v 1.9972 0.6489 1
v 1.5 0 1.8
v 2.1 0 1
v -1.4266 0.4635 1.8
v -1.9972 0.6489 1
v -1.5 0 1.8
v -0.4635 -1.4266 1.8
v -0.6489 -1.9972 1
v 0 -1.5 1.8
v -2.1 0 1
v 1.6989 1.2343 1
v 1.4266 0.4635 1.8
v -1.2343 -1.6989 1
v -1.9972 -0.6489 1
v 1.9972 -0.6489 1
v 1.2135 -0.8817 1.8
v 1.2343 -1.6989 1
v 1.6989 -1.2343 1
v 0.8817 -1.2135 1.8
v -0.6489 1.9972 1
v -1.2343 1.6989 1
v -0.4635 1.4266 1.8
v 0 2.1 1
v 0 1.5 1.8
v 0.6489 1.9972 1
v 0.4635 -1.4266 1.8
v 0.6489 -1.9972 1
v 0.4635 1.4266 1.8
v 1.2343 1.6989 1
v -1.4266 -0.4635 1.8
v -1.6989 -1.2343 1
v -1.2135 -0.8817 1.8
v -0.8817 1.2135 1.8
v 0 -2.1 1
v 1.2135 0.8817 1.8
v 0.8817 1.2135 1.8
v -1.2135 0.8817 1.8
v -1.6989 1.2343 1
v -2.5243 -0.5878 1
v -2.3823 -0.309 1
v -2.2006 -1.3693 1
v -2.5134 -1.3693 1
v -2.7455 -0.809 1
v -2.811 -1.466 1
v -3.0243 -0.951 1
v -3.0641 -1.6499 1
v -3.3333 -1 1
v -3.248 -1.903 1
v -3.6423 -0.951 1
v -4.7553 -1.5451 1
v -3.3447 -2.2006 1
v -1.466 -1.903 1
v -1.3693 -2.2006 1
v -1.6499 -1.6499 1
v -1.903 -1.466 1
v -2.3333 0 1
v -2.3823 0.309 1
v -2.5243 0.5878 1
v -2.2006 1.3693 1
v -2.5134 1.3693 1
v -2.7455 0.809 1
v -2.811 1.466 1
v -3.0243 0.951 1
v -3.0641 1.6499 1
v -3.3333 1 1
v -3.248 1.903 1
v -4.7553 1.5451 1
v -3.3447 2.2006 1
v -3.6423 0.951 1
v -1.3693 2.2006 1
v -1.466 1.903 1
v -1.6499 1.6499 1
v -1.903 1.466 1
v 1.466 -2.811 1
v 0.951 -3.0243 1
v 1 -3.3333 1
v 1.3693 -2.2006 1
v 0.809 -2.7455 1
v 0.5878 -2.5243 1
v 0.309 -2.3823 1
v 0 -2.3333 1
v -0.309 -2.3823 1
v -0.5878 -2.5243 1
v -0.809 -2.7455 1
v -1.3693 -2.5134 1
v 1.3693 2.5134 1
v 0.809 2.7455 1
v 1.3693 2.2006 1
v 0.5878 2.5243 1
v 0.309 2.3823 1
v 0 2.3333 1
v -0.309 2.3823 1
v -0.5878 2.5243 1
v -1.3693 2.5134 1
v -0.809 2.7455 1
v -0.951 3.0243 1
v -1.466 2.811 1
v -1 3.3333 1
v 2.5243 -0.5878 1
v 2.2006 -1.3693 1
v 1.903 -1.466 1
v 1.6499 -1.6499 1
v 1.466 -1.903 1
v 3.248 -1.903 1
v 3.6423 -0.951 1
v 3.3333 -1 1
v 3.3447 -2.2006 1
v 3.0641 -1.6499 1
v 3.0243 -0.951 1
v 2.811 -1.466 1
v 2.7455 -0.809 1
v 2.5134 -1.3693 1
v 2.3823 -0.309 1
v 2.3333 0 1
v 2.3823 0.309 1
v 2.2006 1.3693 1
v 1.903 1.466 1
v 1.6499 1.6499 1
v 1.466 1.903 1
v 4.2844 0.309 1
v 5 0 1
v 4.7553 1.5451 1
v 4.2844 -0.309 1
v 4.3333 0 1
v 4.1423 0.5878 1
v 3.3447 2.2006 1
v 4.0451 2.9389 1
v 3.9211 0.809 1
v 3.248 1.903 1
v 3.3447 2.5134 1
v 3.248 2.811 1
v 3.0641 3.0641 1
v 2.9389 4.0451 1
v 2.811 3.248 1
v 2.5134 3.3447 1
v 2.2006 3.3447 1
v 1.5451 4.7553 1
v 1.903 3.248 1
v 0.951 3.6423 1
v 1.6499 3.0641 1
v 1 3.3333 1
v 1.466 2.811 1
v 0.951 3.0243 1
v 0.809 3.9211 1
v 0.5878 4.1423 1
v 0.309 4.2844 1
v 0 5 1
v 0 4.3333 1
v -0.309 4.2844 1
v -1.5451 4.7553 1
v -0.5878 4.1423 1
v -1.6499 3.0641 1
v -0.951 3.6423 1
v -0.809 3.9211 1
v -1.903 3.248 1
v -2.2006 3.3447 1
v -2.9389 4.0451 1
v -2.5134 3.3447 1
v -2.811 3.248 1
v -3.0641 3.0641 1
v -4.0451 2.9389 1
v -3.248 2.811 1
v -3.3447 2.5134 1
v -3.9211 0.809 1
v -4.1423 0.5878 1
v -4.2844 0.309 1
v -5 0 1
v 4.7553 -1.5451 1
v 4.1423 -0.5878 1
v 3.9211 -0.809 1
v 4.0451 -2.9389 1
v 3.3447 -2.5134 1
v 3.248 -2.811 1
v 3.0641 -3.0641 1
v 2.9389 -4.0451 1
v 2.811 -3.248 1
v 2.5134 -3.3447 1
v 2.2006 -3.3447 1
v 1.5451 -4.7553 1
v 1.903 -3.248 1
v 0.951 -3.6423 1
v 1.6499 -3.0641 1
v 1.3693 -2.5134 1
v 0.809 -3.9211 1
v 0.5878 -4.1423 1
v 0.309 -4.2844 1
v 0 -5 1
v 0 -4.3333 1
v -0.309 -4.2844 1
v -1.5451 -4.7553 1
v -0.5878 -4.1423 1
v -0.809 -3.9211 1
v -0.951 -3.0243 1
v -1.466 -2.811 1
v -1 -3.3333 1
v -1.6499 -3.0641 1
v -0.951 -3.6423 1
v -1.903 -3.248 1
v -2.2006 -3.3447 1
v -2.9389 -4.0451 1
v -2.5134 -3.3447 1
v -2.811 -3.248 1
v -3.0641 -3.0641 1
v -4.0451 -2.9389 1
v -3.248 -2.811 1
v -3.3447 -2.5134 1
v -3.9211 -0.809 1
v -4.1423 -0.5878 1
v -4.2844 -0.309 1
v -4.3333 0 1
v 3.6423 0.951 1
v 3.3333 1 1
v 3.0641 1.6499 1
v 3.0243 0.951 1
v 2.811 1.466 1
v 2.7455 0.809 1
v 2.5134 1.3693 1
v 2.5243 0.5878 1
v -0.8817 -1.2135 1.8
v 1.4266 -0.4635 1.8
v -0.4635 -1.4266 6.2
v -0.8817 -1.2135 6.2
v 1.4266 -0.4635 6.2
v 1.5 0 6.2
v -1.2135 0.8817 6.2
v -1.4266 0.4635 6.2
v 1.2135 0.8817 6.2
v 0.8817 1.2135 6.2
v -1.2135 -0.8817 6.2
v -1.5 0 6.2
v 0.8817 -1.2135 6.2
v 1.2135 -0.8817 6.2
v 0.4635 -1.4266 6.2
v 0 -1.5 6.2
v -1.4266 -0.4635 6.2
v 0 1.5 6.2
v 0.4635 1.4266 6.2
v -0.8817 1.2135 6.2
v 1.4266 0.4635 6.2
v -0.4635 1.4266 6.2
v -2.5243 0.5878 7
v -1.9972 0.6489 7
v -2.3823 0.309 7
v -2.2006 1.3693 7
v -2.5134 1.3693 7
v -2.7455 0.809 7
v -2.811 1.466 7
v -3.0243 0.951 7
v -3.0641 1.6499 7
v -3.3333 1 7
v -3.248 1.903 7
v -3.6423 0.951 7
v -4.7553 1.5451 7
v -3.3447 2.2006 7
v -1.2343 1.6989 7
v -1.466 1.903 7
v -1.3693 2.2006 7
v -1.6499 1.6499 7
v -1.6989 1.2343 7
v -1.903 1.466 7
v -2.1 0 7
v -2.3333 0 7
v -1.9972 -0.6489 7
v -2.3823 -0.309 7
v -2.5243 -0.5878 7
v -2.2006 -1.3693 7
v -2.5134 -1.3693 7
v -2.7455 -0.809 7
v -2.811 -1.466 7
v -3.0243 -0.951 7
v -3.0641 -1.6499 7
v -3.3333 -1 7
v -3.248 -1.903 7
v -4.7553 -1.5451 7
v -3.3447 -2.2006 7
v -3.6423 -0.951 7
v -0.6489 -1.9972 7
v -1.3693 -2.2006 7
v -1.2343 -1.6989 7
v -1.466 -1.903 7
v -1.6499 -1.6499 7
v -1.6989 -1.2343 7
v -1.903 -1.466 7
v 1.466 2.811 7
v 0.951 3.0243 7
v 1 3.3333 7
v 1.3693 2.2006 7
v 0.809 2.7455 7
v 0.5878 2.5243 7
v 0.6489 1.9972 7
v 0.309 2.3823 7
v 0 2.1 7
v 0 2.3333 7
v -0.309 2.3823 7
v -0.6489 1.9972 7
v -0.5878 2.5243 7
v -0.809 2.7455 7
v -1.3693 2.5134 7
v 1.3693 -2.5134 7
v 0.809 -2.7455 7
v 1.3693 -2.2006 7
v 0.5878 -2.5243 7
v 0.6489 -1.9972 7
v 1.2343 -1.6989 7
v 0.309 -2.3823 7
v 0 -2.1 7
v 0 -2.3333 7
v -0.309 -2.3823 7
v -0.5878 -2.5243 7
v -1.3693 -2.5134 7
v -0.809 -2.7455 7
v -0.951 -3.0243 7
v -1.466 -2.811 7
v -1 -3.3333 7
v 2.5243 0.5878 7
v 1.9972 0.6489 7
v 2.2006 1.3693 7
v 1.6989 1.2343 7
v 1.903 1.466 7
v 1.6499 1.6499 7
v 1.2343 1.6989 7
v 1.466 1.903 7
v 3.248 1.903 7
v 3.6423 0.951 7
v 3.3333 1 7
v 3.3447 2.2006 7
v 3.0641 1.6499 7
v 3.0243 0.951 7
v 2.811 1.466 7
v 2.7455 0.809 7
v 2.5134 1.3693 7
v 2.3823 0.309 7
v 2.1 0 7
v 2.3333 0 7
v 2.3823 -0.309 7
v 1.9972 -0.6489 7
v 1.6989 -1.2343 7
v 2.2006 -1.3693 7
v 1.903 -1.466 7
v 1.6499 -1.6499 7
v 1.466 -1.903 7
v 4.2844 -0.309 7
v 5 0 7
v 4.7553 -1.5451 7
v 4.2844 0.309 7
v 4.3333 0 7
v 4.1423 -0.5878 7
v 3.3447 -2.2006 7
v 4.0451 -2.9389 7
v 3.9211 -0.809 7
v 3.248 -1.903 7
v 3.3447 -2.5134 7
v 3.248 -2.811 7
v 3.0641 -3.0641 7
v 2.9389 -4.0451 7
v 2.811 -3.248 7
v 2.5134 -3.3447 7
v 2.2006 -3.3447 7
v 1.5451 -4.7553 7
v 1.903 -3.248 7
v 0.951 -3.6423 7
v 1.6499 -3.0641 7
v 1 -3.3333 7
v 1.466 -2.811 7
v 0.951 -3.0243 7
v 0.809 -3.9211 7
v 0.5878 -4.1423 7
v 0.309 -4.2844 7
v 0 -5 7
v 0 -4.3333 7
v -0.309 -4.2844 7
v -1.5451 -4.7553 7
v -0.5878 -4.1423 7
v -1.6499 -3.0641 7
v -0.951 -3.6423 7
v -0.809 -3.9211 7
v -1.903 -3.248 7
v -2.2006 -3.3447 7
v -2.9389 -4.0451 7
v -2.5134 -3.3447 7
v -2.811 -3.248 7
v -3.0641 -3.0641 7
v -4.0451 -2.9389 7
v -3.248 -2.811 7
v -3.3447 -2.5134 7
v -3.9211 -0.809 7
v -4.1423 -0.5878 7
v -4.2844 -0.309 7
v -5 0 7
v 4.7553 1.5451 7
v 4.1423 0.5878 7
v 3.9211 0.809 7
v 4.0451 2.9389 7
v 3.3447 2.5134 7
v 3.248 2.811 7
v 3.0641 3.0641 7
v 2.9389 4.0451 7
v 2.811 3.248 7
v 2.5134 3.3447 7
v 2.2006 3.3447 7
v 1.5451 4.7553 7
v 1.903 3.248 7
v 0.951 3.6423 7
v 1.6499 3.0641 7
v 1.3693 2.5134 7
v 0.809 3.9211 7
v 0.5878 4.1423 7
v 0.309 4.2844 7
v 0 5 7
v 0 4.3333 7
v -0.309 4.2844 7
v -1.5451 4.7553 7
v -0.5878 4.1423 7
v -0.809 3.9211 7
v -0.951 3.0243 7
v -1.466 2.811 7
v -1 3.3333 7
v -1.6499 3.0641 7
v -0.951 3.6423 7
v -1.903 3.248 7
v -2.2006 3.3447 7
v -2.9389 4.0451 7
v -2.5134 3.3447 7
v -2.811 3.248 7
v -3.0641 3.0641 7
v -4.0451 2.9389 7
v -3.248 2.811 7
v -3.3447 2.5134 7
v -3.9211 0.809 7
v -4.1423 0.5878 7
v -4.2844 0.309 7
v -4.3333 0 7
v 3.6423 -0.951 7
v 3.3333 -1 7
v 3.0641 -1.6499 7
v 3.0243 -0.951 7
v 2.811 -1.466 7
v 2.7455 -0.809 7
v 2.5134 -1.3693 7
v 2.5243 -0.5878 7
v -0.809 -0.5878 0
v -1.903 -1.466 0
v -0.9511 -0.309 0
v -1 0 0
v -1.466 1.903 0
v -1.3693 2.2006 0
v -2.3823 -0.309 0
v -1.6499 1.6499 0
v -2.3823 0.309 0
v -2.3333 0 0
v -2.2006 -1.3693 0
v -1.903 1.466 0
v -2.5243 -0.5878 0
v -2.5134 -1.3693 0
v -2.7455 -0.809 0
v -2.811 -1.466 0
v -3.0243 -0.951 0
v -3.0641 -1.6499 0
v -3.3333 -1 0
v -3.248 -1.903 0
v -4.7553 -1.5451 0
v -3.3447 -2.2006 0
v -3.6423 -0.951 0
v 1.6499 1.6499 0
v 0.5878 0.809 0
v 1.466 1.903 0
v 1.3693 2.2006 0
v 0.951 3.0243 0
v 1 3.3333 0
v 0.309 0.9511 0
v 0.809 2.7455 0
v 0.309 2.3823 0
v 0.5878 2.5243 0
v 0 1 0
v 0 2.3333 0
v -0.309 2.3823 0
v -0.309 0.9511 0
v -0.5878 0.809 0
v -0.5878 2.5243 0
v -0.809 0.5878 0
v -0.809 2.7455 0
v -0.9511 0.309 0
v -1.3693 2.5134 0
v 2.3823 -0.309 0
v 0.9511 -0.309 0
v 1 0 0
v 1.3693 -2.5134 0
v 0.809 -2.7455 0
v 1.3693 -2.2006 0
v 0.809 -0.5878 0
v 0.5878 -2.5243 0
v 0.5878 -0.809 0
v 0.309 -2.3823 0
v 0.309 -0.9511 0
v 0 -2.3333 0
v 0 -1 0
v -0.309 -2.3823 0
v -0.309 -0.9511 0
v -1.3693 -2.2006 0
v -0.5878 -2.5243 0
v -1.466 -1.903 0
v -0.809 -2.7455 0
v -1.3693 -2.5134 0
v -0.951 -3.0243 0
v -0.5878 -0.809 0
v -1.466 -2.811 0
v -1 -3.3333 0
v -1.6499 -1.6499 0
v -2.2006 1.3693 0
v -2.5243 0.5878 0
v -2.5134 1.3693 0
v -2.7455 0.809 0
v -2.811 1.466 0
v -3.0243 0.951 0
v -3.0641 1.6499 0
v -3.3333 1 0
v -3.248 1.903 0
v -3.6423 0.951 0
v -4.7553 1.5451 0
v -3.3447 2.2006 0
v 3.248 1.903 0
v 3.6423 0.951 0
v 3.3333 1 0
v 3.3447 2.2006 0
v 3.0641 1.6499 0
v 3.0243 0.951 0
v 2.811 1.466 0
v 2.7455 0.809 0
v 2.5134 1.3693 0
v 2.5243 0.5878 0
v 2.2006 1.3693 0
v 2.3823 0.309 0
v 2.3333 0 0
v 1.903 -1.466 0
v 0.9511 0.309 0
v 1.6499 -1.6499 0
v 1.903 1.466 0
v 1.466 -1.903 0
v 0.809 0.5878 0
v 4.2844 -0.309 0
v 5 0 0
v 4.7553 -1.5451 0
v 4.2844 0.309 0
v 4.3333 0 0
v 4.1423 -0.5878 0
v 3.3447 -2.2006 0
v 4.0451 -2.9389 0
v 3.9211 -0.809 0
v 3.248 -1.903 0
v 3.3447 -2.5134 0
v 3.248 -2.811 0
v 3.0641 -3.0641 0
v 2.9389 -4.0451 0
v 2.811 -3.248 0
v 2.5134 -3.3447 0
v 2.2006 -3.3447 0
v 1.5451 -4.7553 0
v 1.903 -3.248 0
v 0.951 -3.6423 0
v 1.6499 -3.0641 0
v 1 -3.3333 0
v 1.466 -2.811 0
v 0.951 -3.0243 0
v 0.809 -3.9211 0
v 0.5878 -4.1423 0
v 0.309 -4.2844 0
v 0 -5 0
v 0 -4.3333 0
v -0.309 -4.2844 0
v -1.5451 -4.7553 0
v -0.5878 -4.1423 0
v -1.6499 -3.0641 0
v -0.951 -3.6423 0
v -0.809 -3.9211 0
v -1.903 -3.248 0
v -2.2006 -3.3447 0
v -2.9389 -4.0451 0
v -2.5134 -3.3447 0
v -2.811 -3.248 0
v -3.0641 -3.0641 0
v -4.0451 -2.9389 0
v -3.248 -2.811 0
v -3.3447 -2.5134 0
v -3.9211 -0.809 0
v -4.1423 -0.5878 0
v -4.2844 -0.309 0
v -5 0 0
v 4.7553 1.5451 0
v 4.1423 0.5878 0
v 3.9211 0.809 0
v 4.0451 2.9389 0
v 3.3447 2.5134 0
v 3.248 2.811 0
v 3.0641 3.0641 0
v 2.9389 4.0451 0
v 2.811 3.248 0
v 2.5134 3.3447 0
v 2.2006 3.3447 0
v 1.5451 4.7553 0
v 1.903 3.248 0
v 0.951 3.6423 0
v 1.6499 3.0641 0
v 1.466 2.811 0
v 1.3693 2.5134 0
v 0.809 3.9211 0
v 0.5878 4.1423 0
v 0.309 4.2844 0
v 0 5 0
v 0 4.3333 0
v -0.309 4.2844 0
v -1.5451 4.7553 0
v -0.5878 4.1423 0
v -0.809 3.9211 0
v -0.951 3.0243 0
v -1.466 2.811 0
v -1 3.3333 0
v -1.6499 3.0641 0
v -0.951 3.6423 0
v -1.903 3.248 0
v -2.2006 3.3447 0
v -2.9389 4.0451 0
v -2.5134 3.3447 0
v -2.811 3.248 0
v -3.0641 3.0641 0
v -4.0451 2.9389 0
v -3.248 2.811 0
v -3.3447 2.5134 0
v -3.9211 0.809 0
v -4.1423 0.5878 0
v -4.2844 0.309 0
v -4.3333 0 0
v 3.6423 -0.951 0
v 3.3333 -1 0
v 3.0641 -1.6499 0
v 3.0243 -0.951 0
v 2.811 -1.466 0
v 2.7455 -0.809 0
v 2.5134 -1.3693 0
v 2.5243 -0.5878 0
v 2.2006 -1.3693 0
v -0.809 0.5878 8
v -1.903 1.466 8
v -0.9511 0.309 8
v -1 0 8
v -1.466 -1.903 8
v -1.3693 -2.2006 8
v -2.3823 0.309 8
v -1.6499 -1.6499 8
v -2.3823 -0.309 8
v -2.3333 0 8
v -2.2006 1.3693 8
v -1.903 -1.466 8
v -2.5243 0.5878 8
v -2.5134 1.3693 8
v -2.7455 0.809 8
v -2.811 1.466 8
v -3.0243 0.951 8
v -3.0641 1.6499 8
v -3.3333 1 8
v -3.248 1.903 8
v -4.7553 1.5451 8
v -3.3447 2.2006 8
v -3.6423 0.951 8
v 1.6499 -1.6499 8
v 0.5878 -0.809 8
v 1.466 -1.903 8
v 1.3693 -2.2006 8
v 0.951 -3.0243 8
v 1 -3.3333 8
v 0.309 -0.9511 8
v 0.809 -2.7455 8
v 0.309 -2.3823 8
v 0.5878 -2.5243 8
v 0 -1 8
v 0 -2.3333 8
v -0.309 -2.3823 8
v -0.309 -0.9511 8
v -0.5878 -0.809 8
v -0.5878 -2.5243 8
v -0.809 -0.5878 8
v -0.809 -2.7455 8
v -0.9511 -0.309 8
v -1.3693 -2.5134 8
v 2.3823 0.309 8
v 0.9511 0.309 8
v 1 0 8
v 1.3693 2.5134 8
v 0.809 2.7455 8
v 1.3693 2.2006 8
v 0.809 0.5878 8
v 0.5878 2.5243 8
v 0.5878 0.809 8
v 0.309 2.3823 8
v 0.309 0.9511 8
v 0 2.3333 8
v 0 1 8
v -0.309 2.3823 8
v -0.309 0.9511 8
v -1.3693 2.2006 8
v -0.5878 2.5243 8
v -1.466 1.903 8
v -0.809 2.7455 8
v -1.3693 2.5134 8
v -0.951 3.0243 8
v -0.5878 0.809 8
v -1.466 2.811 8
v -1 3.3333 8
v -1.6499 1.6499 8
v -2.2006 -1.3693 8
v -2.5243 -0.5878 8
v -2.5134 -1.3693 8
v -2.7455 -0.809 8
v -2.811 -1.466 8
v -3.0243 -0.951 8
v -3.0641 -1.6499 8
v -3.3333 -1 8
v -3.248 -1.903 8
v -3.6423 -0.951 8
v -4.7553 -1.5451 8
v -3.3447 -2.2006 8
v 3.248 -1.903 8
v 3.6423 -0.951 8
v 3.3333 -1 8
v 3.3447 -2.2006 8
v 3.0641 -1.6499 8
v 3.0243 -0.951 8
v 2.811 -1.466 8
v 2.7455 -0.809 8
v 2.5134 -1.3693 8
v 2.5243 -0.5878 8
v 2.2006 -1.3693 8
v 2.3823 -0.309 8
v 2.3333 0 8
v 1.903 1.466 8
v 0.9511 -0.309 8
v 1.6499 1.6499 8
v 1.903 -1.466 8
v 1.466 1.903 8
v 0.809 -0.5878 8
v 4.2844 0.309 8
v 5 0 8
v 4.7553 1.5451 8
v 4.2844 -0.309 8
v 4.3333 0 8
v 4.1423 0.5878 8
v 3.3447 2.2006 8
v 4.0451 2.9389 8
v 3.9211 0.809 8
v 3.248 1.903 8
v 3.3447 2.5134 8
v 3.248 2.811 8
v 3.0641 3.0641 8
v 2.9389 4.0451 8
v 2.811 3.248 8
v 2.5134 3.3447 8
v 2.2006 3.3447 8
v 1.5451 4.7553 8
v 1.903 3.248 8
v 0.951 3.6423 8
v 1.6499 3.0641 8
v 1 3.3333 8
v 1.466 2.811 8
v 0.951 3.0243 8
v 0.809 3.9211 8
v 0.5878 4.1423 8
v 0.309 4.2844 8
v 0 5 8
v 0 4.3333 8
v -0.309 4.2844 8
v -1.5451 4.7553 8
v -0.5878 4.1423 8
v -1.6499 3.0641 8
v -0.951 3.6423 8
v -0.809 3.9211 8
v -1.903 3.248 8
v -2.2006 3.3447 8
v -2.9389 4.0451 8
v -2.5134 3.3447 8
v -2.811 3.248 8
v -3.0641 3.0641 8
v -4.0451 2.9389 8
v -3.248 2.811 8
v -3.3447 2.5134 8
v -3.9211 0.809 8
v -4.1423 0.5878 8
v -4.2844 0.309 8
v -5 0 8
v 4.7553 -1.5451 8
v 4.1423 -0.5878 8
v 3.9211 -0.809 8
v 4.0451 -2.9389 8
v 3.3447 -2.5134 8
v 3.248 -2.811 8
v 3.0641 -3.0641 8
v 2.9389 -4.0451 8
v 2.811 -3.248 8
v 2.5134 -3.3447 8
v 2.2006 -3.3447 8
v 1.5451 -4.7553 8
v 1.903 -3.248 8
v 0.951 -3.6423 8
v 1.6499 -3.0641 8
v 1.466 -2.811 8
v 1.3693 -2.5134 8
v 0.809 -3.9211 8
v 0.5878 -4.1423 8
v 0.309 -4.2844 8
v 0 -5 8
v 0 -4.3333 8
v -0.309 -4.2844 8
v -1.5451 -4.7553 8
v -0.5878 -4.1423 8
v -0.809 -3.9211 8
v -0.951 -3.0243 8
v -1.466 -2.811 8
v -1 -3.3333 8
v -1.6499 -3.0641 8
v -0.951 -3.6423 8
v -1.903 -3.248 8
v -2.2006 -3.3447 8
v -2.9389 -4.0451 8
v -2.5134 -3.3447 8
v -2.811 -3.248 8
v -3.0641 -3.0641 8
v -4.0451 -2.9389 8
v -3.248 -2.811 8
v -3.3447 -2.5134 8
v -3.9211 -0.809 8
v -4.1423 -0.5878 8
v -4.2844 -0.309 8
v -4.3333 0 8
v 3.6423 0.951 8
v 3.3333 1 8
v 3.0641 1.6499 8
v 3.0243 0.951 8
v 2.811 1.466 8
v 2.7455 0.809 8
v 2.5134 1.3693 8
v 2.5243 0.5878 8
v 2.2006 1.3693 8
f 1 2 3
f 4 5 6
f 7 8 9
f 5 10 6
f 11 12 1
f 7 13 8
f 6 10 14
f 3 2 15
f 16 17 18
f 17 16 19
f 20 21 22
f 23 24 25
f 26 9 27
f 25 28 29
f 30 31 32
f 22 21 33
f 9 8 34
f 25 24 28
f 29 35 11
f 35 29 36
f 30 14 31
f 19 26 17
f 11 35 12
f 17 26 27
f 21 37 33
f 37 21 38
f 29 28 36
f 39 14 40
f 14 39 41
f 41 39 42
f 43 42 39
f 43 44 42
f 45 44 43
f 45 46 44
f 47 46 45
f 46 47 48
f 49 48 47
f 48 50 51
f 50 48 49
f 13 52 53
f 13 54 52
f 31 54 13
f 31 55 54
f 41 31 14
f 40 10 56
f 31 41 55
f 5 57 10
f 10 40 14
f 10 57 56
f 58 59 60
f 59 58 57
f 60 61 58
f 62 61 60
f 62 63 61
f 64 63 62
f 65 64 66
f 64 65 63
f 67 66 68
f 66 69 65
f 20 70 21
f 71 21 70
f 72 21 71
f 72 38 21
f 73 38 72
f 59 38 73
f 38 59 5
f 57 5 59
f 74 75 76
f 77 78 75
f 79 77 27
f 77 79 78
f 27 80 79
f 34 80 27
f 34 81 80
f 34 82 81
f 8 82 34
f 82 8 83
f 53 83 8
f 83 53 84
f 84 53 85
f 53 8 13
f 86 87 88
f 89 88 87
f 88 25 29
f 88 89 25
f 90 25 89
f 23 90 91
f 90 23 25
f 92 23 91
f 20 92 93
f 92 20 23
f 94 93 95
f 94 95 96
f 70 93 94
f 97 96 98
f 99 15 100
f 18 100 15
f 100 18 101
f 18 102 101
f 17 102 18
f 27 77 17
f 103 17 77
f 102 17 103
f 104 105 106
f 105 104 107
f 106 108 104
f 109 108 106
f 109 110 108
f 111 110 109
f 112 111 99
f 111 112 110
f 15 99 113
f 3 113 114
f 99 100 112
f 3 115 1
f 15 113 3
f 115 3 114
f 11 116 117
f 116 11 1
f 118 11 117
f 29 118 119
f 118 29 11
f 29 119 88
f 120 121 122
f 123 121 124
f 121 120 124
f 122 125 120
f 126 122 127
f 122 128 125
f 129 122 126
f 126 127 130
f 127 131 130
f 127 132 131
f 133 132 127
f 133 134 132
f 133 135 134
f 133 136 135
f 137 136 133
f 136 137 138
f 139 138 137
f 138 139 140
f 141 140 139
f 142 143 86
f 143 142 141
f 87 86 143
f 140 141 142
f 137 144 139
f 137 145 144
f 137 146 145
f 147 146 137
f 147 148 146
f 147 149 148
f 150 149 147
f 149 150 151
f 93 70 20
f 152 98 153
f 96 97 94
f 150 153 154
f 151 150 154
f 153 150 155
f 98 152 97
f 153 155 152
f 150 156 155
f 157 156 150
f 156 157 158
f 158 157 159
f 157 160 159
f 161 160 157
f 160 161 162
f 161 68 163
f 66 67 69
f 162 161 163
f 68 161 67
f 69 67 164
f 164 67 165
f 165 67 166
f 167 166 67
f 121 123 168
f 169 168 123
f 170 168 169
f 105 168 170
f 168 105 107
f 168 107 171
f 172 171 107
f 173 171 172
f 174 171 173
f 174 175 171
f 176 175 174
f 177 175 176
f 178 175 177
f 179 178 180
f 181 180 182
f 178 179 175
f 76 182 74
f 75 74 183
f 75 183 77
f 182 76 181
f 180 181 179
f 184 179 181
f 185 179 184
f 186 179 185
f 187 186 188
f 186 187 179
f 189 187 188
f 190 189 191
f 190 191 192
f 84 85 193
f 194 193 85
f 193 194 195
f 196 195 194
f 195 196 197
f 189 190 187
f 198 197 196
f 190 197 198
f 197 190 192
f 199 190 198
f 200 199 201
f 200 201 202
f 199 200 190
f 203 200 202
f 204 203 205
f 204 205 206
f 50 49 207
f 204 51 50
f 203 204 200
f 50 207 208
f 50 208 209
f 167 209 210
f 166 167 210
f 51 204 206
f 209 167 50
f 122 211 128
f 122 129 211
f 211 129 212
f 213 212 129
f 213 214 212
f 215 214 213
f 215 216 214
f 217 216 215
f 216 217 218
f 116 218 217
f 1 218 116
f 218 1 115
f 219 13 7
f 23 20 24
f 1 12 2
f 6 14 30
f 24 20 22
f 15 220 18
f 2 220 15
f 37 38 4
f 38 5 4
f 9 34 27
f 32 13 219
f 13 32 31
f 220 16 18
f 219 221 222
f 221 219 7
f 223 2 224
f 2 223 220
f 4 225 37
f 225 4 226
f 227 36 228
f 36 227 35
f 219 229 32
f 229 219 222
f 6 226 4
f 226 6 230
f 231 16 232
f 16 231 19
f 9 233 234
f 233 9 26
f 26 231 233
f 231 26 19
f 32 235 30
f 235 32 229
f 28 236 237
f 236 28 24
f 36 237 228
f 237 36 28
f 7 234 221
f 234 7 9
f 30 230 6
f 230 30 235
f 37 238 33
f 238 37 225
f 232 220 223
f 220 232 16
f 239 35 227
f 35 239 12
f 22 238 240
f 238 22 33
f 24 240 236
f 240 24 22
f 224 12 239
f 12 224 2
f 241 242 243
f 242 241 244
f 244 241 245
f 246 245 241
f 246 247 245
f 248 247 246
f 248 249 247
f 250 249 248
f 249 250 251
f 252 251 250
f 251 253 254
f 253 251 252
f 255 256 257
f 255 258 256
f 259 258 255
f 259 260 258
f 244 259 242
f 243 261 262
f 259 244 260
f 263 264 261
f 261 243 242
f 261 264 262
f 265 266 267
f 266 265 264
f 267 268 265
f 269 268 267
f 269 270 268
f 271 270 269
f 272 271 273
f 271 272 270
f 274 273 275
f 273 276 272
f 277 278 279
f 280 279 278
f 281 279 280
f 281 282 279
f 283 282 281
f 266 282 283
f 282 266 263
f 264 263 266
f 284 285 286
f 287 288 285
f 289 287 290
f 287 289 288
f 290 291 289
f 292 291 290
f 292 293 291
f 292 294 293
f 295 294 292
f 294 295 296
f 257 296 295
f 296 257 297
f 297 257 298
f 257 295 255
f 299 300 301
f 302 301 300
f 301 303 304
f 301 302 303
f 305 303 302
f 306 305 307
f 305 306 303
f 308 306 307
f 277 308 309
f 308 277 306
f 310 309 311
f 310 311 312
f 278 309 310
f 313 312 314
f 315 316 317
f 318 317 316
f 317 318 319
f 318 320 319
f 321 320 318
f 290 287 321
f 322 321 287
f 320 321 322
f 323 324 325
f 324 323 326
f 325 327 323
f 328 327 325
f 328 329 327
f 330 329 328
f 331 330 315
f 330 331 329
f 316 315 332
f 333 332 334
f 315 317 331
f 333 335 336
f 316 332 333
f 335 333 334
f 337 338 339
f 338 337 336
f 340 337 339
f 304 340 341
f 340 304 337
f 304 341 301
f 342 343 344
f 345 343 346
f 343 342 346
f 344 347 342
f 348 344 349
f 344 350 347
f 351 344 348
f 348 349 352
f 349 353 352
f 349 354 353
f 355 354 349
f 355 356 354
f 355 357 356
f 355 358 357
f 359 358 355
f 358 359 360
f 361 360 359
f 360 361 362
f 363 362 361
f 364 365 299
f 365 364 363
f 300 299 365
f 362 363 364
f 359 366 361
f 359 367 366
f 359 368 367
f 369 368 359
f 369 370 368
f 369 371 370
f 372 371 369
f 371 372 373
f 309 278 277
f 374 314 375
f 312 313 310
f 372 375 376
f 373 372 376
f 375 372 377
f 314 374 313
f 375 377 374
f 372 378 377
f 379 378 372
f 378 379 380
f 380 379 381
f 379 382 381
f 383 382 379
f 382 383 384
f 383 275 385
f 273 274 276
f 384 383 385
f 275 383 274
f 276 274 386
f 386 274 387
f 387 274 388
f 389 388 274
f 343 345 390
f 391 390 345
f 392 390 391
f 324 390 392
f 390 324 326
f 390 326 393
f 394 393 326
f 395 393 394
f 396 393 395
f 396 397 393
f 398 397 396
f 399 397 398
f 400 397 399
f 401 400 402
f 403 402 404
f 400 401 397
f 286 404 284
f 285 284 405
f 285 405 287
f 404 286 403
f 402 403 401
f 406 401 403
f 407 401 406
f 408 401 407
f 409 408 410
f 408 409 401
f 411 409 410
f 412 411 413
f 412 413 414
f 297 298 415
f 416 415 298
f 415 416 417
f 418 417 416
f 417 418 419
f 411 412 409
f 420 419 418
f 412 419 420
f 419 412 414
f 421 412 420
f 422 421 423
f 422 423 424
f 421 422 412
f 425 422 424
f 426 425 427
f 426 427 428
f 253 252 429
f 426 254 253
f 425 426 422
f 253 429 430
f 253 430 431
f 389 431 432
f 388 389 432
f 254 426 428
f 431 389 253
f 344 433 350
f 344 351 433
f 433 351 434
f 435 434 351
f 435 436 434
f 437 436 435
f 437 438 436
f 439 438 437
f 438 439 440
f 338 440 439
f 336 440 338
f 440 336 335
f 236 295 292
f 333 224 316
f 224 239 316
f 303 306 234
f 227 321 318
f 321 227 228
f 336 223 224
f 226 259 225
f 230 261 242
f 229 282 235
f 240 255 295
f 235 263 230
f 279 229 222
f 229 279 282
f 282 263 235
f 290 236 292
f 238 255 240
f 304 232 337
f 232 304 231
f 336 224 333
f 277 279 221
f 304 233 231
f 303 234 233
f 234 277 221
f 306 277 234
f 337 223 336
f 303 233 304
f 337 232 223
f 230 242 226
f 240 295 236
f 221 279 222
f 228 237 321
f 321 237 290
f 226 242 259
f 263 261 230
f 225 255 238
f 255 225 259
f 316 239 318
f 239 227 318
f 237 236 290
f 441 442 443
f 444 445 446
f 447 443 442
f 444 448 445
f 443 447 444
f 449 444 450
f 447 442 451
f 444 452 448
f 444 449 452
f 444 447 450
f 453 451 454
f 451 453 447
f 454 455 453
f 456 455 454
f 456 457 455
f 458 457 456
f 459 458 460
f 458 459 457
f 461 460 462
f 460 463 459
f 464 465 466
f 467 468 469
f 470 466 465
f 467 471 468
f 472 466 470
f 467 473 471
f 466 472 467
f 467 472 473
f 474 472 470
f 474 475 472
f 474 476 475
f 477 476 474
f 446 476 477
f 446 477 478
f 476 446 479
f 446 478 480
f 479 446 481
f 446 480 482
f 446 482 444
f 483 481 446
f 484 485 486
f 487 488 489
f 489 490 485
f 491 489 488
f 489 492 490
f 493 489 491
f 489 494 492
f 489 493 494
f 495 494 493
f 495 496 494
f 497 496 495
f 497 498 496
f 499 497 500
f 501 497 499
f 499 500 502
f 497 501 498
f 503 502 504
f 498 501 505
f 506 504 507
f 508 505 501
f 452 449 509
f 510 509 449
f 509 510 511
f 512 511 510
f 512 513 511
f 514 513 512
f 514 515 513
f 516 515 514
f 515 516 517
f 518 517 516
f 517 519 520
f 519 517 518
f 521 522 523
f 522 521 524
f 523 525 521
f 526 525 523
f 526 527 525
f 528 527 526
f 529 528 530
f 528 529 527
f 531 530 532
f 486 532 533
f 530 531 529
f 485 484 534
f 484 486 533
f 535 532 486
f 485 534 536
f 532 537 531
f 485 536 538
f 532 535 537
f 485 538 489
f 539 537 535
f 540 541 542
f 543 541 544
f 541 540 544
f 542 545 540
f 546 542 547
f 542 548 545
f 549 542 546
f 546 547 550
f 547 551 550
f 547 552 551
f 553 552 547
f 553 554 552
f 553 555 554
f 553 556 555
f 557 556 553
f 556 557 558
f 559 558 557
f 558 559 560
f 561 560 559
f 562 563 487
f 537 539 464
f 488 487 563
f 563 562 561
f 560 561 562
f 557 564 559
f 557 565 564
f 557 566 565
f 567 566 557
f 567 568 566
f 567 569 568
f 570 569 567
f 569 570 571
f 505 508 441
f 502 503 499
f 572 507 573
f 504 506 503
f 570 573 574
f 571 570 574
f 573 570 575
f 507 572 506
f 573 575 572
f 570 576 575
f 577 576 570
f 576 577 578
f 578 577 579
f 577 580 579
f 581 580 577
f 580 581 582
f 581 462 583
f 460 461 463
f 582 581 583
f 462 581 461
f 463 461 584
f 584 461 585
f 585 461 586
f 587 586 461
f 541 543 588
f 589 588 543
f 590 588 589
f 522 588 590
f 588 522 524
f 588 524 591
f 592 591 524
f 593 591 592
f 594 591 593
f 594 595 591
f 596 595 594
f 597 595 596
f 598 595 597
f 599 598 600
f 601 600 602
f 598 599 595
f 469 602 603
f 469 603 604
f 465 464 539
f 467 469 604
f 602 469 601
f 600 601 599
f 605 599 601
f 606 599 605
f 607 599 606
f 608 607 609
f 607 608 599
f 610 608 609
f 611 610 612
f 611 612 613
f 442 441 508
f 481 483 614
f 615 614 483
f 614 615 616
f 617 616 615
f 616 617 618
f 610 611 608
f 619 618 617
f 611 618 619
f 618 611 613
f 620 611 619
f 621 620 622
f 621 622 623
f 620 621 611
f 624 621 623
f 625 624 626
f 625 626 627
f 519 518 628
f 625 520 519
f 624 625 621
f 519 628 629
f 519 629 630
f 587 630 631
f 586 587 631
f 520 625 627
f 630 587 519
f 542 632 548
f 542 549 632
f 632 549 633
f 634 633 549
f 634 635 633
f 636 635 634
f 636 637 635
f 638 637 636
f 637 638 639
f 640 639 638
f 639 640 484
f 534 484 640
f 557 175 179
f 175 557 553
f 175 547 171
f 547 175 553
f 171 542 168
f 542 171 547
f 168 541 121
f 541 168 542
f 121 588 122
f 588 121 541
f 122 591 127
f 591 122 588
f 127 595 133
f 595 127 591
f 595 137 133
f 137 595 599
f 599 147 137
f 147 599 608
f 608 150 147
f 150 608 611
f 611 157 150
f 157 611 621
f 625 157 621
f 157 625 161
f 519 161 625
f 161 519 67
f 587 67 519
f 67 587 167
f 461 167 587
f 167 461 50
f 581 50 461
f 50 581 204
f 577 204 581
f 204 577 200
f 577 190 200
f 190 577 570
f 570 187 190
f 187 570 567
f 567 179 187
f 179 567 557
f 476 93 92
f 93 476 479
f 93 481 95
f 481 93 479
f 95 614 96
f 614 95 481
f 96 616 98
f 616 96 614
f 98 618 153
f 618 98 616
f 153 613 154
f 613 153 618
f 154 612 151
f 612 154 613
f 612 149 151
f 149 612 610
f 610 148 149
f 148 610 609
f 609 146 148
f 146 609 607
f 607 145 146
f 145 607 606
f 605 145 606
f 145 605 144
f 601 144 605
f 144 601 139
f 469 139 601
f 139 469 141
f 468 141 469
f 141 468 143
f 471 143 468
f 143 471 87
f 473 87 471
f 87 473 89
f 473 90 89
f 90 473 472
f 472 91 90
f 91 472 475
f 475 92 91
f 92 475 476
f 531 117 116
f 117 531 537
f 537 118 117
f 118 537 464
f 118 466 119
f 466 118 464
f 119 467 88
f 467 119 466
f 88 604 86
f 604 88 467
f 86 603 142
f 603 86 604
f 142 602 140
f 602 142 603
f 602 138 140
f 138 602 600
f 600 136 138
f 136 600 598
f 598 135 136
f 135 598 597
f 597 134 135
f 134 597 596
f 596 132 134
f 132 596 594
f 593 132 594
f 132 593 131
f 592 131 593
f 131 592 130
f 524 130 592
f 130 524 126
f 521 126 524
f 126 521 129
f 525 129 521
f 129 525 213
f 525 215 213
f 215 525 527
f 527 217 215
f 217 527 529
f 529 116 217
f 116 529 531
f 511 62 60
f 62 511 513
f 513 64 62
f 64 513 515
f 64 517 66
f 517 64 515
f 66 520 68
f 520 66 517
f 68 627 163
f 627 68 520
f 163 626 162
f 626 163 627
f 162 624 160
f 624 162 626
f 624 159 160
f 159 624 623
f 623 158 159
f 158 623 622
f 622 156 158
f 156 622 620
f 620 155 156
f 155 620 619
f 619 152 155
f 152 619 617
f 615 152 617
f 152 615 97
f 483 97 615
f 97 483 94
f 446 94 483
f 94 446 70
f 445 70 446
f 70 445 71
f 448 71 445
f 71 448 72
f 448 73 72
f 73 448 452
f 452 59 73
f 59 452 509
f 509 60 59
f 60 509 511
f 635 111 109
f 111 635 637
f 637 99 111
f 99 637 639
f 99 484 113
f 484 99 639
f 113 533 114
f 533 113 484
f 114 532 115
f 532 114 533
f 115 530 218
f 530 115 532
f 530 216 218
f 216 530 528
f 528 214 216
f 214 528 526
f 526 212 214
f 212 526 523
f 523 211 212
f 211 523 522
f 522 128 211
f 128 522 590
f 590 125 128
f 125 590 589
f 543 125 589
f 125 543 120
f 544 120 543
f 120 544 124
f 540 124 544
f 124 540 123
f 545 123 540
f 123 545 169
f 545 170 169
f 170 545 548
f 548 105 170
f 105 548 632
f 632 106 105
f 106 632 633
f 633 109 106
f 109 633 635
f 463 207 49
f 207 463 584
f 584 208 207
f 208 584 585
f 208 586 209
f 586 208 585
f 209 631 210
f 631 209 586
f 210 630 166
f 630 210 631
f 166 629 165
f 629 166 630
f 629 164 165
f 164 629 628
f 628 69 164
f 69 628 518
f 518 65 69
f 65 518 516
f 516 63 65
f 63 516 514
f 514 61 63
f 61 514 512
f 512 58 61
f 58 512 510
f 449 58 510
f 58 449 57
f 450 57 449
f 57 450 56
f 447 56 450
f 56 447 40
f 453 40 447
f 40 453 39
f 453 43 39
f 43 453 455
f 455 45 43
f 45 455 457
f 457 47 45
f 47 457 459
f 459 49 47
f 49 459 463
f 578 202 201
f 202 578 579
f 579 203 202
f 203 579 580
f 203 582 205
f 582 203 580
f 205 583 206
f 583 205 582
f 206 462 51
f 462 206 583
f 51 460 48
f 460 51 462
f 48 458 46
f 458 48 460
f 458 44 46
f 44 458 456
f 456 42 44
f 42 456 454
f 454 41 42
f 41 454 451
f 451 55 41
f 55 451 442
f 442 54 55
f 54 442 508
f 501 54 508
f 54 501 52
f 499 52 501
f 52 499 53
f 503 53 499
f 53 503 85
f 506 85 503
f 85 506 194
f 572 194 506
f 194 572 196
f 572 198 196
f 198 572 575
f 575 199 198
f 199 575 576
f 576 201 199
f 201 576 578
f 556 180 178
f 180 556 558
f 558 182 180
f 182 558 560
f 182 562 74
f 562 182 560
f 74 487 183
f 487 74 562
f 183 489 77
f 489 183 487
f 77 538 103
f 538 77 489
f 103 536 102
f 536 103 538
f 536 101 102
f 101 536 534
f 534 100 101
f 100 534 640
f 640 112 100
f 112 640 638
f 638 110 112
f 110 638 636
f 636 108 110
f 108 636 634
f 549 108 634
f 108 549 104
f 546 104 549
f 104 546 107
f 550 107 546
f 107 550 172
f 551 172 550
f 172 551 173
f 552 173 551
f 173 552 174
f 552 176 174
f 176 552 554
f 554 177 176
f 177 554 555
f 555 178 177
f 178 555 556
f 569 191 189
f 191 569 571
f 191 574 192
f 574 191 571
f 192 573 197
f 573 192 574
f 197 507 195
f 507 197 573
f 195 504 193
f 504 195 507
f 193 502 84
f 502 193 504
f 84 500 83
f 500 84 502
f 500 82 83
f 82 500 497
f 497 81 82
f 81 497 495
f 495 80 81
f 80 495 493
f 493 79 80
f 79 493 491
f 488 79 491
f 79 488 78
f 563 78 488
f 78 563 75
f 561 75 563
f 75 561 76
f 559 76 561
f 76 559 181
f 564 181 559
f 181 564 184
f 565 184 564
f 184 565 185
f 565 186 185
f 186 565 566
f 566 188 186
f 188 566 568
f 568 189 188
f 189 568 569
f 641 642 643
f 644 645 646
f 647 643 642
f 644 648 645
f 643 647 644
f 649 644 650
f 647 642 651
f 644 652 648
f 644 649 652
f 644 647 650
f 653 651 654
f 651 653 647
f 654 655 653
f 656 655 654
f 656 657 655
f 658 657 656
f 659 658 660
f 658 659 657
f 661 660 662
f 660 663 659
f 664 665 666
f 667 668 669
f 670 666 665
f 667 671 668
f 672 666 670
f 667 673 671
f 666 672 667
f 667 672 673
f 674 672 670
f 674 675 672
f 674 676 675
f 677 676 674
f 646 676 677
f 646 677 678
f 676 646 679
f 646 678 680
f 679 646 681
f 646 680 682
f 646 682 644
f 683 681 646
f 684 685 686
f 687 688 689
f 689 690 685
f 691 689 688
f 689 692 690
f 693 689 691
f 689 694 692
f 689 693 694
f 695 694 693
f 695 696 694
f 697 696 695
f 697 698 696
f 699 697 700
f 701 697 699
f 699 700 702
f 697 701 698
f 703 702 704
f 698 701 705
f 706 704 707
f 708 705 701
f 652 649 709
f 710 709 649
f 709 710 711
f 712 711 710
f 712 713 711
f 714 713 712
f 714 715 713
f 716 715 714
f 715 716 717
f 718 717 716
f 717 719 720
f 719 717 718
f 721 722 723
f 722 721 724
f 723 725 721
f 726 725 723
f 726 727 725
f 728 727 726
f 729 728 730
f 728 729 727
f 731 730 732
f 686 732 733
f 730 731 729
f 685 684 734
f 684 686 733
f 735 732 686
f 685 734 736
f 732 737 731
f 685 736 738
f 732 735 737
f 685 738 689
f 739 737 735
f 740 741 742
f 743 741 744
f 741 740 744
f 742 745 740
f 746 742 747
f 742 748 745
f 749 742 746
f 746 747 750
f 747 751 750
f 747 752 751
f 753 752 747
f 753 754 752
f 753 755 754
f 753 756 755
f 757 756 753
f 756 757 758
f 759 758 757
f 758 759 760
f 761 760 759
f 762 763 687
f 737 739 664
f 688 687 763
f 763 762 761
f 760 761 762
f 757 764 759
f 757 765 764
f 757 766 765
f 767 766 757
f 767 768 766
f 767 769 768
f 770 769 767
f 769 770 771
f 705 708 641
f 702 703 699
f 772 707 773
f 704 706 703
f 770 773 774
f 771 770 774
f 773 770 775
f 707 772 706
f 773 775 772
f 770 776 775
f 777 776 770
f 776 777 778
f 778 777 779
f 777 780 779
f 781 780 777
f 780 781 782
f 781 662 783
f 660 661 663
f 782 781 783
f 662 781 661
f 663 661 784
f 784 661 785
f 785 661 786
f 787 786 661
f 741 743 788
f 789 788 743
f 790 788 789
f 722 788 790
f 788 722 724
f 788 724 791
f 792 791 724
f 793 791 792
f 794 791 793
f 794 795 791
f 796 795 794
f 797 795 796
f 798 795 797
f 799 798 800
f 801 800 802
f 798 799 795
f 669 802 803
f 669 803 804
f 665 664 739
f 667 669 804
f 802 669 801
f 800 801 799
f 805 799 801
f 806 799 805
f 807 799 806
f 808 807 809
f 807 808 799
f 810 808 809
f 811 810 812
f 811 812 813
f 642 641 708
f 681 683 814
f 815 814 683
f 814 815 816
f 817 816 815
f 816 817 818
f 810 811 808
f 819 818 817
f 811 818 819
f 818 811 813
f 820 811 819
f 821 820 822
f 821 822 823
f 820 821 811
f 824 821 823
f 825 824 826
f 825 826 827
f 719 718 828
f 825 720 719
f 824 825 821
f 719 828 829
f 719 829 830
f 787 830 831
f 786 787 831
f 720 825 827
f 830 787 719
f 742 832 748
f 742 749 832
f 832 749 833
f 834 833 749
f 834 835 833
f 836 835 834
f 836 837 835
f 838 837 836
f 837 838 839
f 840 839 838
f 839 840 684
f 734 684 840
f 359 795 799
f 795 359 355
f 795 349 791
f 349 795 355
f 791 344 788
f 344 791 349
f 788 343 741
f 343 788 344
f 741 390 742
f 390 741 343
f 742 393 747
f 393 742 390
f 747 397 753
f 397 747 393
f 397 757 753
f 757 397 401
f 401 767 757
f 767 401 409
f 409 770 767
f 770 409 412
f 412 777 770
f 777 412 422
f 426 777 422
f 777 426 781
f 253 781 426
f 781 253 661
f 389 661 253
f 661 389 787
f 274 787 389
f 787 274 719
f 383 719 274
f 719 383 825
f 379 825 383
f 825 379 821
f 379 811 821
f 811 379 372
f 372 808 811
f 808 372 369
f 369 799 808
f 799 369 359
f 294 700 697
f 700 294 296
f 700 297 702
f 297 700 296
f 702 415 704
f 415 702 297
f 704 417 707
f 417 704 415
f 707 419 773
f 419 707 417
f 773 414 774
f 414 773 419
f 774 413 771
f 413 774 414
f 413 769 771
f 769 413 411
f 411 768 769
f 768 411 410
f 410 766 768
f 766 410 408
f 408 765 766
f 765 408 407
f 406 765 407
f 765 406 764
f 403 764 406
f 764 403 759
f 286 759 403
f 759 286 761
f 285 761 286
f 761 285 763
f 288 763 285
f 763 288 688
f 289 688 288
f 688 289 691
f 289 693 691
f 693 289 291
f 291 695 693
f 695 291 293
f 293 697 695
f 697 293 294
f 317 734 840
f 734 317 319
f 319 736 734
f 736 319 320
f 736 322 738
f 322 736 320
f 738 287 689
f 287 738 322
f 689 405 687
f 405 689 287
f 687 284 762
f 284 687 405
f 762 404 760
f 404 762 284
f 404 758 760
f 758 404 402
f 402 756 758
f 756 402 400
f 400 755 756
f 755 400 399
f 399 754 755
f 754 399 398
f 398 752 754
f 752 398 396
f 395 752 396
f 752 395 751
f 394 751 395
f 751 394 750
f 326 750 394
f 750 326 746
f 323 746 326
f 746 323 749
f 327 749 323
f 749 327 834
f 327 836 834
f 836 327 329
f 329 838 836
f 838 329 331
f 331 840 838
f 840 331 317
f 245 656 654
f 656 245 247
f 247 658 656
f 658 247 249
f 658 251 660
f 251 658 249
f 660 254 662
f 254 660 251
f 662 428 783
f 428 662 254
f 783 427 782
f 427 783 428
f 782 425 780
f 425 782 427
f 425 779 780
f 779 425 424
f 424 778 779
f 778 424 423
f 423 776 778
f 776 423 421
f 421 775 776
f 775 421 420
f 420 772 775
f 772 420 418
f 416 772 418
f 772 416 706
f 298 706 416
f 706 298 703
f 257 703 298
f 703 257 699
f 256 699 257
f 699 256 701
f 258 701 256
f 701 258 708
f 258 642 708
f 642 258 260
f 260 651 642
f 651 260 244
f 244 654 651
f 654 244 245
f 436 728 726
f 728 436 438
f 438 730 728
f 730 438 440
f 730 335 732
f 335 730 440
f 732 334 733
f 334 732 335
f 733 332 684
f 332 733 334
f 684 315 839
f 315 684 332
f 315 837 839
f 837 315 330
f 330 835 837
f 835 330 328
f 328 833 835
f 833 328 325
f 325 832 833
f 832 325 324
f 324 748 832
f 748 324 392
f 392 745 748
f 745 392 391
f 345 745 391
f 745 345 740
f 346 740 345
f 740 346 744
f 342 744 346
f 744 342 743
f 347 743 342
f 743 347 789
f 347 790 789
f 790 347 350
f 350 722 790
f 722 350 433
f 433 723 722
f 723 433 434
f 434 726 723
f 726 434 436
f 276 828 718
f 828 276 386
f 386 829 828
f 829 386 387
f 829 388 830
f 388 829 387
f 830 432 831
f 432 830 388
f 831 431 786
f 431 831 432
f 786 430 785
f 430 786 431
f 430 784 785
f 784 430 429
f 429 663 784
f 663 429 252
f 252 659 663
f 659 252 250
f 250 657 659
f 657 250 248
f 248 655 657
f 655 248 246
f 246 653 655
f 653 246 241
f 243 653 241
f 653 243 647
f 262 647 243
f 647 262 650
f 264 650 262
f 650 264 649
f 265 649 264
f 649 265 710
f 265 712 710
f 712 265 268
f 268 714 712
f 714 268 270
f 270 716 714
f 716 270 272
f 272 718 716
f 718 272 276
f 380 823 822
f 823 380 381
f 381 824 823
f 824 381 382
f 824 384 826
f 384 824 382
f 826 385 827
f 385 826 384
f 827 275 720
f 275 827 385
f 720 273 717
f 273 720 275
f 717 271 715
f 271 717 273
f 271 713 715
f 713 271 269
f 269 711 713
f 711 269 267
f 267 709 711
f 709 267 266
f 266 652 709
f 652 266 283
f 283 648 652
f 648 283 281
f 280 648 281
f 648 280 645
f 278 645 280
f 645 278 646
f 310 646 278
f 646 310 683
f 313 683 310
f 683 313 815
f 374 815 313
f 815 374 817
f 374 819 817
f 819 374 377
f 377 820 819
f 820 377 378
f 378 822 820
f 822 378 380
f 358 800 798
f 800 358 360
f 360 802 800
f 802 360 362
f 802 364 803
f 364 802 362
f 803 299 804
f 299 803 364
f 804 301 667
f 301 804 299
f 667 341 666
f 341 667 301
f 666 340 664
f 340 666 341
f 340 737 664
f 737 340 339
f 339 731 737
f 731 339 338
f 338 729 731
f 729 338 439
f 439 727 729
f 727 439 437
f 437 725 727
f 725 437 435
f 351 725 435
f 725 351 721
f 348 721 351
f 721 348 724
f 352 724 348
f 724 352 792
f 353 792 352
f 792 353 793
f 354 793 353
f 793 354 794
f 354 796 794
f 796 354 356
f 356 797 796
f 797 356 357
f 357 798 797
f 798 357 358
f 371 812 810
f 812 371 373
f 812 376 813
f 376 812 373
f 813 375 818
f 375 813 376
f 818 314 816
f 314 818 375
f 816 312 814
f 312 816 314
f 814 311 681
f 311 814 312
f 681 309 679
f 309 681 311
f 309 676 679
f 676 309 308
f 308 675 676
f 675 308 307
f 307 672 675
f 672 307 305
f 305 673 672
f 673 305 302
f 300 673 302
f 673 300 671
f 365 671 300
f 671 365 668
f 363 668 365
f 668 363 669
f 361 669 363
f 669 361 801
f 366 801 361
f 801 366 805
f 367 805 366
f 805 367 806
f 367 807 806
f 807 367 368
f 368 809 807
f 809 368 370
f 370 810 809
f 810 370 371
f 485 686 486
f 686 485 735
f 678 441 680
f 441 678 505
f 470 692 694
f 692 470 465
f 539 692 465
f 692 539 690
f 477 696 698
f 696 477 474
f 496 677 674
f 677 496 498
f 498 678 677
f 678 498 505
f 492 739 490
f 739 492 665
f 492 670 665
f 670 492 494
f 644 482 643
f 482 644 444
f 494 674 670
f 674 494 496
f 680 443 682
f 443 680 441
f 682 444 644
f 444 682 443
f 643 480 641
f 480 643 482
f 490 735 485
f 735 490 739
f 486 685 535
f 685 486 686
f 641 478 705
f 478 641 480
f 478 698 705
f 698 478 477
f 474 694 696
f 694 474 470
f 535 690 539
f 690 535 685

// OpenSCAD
// parameters

/* [SHAFT] */

SHAFT_LENGTH = 6;
SHAFT_DIAMETER = 3;
SHAFT_HOLE_DIAMETER = 2;

/* [FLANGE] */

FLANGE_LENGTH = 1;
FLANGE_DIAMETER = 10;
FLANGE_HOLE_DIAMETER=2;
FLANGE_NUM_HOLES=8; // [1:50]

/* [FILLET] */

FILLET_LENGTH = 0.8;
FILLET_THICKNESS = 0.6;


// end paremeters


module repeat_on_ellipse(
    semi_major_axis,
    semi_minor_axis,
    num_instances,
    angle_offset = 0,
    include_last = false
) {


    for (j = [0:num_instances - (include_last ? 0 : 1)]) {
        angle = (j * 360 / num_instances) + angle_offset;
        translate([
            semi_major_axis * cos(angle),
            semi_minor_axis * sin(angle)
        ])
        rotate([0, 0, angle])
            children();
    }

}

module repeat_on_circle(
    radius,
    num_instances,
    angle_offset = 0,
    include_last = false
) {

    repeat_on_ellipse(
        semi_major_axis = radius,
        semi_minor_axis = radius,
        num_instances = num_instances,
        angle_offset = angle_offset,
        include_last = include_last
    )
        children();

}

$fn=20;



module bobbin(
    shaft_length = 6,
    shaft_diameter = 3,
    shaft_hole_diameter = 2,
    flange_length = 1,
    flange_diameter = 10,
    flange_hole_diameter,
    flange_num_holes=8,
    fillet_length = 0.8,
    fillet_thickness = 0.6
) {

    difference() {

        union() {

            bobbin_flange(
                flange_length,
                flange_diameter,
                flange_hole_diameter,
                flange_num_holes
            );
            
            _fillet_diameter = shaft_diameter/2 + fillet_thickness;

            translate([0,0,flange_length]) {
            
                cylinder(
                    h=fillet_length,
                    r1=_fillet_diameter,
                    r2=shaft_diameter/2
                );
                
                translate([0,0,fillet_length])
                linear_extrude(shaft_length - fillet_length * 2)
                    circle(d=shaft_diameter);
                    
                translate([0,0,shaft_length - fillet_length])
                cylinder(
                    h=fillet_length,
                    r1=shaft_diameter/2,
                    r2=_fillet_diameter
                );
            }

            translate([0,0,flange_length + shaft_length])
                bobbin_flange(
                    flange_length,
                    flange_diameter,
                    flange_hole_diameter,
                    flange_num_holes
                );

        }

        linear_extrude(flange_length * 2 + shaft_length)
        circle(d=shaft_hole_diameter);
    
    }

}


module bobbin_flange(
    length,
    diameter,
    hole_diameter,
    num_holes=8
 ) {
 
    _hole_diameter = hole_diameter == undef
        ? diameter/5
        : hole_diameter
    ;

    linear_extrude(length)
    difference() {
    
        circle(d=diameter);
        
        repeat_on_circle(
            radius=diameter/3,
            num_instances=num_holes,
            angle_offset = 0,
            include_last = false
        )
            circle(d=_hole_diameter);

        
        
    
    }
    

}


module test() {

    bobbin(
        shaft_length = 6,
        shaft_diameter = 3,
        shaft_hole_diameter = 2,
        flange_length = 1,
        flange_diameter = 10,
        flange_hole_diameter=2,
        flange_num_holes=8,
        fillet_length = 0.8,
        fillet_thickness = 0.6
    );

}


bobbin(
    shaft_length = SHAFT_LENGTH,
    shaft_diameter = SHAFT_DIAMETER,
    shaft_hole_diameter = SHAFT_HOLE_DIAMETER,
    flange_length = FLANGE_LENGTH,
    flange_diameter = FLANGE_DIAMETER,
    flange_hole_diameter=FLANGE_HOLE_DIAMETER,
    flange_num_holes=FLANGE_NUM_HOLES,
    fillet_length = FILLET_LENGTH,
    fillet_thickness = FILLET_THICKNESS
);
